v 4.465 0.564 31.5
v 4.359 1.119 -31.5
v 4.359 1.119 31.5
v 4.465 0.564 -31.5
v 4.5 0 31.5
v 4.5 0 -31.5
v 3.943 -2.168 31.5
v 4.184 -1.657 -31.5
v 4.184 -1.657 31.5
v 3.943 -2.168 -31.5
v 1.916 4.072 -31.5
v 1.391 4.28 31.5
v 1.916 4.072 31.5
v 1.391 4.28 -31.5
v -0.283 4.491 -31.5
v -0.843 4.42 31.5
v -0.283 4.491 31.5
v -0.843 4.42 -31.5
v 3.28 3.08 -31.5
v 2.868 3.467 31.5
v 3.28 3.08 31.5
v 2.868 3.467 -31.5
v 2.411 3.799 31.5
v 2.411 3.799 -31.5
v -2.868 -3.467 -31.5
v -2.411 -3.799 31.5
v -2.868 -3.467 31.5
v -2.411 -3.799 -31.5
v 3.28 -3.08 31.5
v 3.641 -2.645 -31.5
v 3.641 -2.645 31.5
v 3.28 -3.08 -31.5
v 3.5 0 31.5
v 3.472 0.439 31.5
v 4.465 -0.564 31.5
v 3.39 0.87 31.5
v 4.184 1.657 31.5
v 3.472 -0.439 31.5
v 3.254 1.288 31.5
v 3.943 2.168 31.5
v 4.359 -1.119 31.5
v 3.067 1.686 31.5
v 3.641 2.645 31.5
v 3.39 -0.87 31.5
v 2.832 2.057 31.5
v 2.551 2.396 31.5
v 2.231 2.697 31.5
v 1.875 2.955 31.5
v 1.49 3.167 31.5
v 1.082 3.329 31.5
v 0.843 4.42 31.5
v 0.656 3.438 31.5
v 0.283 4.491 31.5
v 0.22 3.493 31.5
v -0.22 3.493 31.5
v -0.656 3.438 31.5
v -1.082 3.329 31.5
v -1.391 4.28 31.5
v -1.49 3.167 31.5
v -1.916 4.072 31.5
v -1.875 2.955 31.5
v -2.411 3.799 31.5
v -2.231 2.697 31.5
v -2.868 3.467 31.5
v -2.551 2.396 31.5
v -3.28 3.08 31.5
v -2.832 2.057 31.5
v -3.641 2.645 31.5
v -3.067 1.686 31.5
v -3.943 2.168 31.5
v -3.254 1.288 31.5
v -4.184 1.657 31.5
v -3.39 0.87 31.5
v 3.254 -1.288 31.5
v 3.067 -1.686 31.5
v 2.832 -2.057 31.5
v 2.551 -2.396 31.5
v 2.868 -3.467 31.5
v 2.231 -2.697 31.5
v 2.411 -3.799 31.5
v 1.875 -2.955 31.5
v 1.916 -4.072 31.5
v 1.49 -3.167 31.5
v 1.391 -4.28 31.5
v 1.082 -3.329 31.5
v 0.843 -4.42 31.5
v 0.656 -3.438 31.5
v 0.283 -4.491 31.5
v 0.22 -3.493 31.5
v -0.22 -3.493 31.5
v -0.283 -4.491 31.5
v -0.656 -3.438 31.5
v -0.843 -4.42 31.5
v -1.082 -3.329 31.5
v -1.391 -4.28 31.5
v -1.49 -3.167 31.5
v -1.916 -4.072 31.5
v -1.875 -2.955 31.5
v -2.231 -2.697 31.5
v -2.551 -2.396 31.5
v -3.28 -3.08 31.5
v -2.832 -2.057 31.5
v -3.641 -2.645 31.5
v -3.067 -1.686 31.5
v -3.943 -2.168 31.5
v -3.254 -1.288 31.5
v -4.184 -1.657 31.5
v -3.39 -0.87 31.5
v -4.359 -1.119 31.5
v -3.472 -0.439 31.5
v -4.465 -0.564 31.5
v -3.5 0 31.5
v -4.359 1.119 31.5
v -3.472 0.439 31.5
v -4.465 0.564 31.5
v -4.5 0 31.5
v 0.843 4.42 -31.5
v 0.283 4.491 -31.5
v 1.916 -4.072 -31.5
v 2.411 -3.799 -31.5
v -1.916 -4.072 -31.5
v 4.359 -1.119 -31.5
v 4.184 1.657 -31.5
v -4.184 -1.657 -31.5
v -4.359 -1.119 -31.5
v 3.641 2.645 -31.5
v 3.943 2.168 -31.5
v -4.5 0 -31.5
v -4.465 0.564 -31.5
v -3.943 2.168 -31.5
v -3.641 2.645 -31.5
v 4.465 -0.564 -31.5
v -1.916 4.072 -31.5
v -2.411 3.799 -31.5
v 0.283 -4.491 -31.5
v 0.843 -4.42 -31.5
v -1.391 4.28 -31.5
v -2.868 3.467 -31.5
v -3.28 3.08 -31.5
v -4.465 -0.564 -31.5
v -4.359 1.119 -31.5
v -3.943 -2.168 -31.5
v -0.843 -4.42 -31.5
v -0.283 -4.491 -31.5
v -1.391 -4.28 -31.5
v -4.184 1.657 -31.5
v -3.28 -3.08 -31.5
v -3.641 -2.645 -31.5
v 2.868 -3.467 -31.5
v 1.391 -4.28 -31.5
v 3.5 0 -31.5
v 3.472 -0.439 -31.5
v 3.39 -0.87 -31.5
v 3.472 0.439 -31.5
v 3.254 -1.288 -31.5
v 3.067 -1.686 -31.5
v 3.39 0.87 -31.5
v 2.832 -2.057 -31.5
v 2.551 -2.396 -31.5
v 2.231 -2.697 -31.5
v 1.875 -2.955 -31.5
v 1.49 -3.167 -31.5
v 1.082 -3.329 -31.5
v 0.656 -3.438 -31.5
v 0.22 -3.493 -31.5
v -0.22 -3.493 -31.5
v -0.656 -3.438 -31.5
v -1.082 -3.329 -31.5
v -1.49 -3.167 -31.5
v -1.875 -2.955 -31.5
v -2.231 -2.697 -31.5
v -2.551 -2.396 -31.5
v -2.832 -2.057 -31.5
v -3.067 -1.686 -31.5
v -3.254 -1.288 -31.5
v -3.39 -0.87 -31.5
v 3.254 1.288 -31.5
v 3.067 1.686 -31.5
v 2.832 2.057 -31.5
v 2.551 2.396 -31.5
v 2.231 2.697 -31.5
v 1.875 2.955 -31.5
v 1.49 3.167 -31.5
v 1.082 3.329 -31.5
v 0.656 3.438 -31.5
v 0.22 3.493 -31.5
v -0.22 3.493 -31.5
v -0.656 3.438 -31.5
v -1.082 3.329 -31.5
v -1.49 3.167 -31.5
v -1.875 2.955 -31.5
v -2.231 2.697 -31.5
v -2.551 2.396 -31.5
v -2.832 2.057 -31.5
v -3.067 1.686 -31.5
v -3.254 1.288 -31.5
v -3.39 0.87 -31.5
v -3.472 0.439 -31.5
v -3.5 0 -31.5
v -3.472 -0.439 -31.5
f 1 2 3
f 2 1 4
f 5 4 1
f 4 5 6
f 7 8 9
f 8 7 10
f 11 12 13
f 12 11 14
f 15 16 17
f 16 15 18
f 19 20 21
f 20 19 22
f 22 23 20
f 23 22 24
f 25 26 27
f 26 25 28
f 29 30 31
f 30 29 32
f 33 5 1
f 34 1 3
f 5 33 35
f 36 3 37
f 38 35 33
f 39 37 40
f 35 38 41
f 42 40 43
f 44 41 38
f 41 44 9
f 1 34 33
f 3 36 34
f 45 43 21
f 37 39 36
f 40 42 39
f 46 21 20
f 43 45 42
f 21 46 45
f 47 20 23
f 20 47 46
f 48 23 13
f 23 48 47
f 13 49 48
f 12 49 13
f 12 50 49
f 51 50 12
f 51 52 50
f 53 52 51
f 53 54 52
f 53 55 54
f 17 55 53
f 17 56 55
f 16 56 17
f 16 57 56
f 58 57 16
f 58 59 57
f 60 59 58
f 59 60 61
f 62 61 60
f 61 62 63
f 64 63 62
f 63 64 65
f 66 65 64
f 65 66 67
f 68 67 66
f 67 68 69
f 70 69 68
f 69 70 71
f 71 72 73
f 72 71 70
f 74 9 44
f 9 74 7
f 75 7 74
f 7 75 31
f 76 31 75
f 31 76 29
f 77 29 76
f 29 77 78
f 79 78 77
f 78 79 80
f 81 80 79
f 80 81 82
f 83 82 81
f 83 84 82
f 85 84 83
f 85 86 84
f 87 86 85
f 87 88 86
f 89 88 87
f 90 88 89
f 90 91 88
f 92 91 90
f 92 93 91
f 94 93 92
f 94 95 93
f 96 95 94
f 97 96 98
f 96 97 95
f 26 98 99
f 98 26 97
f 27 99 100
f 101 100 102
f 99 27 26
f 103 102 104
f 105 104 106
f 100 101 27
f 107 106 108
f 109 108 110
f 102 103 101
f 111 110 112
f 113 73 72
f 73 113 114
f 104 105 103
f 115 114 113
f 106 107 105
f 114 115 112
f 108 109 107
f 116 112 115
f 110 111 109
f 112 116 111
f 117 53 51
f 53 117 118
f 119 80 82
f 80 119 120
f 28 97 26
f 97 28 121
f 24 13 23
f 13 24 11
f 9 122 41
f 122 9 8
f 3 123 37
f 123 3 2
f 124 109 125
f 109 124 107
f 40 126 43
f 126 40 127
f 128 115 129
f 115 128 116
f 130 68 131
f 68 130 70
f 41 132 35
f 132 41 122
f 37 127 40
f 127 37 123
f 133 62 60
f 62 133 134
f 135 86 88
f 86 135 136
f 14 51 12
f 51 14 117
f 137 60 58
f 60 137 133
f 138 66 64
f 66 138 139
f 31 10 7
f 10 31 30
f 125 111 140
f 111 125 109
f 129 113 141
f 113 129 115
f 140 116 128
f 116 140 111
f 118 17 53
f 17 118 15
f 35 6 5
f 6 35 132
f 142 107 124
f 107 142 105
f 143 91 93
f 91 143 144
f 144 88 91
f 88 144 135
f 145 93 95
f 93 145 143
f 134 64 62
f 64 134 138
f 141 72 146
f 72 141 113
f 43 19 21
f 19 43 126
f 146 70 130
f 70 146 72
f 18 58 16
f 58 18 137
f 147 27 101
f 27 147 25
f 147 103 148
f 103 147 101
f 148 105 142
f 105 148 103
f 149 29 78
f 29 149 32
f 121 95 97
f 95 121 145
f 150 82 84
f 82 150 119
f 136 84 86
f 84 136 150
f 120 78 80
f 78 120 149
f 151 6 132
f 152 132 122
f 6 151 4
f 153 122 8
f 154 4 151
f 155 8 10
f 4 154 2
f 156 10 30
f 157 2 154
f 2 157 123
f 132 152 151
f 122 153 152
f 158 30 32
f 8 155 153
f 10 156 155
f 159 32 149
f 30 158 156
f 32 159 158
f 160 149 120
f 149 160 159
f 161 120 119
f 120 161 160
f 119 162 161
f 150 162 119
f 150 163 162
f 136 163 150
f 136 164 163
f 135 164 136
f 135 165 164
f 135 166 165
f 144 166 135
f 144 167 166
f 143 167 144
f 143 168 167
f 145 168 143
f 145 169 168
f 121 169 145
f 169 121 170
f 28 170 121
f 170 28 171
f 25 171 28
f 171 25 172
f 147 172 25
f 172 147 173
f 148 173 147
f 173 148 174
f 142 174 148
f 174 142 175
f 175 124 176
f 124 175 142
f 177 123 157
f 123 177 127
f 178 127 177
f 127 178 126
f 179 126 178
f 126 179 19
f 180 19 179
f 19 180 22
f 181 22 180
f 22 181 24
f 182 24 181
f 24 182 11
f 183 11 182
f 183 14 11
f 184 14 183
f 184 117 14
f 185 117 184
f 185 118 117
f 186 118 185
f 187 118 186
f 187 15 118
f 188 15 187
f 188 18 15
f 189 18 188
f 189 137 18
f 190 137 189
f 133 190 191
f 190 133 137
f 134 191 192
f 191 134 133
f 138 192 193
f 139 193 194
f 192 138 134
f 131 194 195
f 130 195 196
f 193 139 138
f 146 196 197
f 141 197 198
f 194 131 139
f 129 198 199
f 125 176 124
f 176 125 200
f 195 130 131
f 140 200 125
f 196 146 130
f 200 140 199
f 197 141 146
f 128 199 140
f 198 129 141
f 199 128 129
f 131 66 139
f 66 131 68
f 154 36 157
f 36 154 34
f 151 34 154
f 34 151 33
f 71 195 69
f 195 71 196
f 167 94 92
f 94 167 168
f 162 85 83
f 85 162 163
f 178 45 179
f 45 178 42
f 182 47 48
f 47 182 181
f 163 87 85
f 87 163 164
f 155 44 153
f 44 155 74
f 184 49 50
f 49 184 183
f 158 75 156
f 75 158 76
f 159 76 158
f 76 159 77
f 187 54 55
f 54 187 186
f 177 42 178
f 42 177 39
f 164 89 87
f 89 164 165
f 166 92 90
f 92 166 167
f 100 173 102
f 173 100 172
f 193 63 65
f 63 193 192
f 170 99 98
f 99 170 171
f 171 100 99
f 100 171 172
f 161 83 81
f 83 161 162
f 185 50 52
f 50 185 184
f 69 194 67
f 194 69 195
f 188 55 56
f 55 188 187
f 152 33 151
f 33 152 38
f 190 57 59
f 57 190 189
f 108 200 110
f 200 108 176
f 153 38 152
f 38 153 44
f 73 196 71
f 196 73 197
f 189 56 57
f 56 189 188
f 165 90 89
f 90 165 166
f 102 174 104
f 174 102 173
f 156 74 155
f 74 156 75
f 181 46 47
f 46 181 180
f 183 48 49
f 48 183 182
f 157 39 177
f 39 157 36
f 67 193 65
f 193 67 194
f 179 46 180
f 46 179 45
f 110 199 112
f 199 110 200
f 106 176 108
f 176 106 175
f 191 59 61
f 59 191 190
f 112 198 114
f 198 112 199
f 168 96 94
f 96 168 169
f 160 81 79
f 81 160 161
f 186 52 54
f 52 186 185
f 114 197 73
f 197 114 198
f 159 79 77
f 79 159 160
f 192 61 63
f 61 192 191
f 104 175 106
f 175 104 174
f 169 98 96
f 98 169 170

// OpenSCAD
$fn = 50;


difference() {
	union() {
		translate(v = [0, 0, -31.5000000000]) {
			cylinder(h = 63, r = 4.5000000000);
		}
	}
	union() {
		translate(v = [0, 0, -100.0000000000]) {
			cylinder(h = 200, r = 3.5000000000);
		}
	}
}
